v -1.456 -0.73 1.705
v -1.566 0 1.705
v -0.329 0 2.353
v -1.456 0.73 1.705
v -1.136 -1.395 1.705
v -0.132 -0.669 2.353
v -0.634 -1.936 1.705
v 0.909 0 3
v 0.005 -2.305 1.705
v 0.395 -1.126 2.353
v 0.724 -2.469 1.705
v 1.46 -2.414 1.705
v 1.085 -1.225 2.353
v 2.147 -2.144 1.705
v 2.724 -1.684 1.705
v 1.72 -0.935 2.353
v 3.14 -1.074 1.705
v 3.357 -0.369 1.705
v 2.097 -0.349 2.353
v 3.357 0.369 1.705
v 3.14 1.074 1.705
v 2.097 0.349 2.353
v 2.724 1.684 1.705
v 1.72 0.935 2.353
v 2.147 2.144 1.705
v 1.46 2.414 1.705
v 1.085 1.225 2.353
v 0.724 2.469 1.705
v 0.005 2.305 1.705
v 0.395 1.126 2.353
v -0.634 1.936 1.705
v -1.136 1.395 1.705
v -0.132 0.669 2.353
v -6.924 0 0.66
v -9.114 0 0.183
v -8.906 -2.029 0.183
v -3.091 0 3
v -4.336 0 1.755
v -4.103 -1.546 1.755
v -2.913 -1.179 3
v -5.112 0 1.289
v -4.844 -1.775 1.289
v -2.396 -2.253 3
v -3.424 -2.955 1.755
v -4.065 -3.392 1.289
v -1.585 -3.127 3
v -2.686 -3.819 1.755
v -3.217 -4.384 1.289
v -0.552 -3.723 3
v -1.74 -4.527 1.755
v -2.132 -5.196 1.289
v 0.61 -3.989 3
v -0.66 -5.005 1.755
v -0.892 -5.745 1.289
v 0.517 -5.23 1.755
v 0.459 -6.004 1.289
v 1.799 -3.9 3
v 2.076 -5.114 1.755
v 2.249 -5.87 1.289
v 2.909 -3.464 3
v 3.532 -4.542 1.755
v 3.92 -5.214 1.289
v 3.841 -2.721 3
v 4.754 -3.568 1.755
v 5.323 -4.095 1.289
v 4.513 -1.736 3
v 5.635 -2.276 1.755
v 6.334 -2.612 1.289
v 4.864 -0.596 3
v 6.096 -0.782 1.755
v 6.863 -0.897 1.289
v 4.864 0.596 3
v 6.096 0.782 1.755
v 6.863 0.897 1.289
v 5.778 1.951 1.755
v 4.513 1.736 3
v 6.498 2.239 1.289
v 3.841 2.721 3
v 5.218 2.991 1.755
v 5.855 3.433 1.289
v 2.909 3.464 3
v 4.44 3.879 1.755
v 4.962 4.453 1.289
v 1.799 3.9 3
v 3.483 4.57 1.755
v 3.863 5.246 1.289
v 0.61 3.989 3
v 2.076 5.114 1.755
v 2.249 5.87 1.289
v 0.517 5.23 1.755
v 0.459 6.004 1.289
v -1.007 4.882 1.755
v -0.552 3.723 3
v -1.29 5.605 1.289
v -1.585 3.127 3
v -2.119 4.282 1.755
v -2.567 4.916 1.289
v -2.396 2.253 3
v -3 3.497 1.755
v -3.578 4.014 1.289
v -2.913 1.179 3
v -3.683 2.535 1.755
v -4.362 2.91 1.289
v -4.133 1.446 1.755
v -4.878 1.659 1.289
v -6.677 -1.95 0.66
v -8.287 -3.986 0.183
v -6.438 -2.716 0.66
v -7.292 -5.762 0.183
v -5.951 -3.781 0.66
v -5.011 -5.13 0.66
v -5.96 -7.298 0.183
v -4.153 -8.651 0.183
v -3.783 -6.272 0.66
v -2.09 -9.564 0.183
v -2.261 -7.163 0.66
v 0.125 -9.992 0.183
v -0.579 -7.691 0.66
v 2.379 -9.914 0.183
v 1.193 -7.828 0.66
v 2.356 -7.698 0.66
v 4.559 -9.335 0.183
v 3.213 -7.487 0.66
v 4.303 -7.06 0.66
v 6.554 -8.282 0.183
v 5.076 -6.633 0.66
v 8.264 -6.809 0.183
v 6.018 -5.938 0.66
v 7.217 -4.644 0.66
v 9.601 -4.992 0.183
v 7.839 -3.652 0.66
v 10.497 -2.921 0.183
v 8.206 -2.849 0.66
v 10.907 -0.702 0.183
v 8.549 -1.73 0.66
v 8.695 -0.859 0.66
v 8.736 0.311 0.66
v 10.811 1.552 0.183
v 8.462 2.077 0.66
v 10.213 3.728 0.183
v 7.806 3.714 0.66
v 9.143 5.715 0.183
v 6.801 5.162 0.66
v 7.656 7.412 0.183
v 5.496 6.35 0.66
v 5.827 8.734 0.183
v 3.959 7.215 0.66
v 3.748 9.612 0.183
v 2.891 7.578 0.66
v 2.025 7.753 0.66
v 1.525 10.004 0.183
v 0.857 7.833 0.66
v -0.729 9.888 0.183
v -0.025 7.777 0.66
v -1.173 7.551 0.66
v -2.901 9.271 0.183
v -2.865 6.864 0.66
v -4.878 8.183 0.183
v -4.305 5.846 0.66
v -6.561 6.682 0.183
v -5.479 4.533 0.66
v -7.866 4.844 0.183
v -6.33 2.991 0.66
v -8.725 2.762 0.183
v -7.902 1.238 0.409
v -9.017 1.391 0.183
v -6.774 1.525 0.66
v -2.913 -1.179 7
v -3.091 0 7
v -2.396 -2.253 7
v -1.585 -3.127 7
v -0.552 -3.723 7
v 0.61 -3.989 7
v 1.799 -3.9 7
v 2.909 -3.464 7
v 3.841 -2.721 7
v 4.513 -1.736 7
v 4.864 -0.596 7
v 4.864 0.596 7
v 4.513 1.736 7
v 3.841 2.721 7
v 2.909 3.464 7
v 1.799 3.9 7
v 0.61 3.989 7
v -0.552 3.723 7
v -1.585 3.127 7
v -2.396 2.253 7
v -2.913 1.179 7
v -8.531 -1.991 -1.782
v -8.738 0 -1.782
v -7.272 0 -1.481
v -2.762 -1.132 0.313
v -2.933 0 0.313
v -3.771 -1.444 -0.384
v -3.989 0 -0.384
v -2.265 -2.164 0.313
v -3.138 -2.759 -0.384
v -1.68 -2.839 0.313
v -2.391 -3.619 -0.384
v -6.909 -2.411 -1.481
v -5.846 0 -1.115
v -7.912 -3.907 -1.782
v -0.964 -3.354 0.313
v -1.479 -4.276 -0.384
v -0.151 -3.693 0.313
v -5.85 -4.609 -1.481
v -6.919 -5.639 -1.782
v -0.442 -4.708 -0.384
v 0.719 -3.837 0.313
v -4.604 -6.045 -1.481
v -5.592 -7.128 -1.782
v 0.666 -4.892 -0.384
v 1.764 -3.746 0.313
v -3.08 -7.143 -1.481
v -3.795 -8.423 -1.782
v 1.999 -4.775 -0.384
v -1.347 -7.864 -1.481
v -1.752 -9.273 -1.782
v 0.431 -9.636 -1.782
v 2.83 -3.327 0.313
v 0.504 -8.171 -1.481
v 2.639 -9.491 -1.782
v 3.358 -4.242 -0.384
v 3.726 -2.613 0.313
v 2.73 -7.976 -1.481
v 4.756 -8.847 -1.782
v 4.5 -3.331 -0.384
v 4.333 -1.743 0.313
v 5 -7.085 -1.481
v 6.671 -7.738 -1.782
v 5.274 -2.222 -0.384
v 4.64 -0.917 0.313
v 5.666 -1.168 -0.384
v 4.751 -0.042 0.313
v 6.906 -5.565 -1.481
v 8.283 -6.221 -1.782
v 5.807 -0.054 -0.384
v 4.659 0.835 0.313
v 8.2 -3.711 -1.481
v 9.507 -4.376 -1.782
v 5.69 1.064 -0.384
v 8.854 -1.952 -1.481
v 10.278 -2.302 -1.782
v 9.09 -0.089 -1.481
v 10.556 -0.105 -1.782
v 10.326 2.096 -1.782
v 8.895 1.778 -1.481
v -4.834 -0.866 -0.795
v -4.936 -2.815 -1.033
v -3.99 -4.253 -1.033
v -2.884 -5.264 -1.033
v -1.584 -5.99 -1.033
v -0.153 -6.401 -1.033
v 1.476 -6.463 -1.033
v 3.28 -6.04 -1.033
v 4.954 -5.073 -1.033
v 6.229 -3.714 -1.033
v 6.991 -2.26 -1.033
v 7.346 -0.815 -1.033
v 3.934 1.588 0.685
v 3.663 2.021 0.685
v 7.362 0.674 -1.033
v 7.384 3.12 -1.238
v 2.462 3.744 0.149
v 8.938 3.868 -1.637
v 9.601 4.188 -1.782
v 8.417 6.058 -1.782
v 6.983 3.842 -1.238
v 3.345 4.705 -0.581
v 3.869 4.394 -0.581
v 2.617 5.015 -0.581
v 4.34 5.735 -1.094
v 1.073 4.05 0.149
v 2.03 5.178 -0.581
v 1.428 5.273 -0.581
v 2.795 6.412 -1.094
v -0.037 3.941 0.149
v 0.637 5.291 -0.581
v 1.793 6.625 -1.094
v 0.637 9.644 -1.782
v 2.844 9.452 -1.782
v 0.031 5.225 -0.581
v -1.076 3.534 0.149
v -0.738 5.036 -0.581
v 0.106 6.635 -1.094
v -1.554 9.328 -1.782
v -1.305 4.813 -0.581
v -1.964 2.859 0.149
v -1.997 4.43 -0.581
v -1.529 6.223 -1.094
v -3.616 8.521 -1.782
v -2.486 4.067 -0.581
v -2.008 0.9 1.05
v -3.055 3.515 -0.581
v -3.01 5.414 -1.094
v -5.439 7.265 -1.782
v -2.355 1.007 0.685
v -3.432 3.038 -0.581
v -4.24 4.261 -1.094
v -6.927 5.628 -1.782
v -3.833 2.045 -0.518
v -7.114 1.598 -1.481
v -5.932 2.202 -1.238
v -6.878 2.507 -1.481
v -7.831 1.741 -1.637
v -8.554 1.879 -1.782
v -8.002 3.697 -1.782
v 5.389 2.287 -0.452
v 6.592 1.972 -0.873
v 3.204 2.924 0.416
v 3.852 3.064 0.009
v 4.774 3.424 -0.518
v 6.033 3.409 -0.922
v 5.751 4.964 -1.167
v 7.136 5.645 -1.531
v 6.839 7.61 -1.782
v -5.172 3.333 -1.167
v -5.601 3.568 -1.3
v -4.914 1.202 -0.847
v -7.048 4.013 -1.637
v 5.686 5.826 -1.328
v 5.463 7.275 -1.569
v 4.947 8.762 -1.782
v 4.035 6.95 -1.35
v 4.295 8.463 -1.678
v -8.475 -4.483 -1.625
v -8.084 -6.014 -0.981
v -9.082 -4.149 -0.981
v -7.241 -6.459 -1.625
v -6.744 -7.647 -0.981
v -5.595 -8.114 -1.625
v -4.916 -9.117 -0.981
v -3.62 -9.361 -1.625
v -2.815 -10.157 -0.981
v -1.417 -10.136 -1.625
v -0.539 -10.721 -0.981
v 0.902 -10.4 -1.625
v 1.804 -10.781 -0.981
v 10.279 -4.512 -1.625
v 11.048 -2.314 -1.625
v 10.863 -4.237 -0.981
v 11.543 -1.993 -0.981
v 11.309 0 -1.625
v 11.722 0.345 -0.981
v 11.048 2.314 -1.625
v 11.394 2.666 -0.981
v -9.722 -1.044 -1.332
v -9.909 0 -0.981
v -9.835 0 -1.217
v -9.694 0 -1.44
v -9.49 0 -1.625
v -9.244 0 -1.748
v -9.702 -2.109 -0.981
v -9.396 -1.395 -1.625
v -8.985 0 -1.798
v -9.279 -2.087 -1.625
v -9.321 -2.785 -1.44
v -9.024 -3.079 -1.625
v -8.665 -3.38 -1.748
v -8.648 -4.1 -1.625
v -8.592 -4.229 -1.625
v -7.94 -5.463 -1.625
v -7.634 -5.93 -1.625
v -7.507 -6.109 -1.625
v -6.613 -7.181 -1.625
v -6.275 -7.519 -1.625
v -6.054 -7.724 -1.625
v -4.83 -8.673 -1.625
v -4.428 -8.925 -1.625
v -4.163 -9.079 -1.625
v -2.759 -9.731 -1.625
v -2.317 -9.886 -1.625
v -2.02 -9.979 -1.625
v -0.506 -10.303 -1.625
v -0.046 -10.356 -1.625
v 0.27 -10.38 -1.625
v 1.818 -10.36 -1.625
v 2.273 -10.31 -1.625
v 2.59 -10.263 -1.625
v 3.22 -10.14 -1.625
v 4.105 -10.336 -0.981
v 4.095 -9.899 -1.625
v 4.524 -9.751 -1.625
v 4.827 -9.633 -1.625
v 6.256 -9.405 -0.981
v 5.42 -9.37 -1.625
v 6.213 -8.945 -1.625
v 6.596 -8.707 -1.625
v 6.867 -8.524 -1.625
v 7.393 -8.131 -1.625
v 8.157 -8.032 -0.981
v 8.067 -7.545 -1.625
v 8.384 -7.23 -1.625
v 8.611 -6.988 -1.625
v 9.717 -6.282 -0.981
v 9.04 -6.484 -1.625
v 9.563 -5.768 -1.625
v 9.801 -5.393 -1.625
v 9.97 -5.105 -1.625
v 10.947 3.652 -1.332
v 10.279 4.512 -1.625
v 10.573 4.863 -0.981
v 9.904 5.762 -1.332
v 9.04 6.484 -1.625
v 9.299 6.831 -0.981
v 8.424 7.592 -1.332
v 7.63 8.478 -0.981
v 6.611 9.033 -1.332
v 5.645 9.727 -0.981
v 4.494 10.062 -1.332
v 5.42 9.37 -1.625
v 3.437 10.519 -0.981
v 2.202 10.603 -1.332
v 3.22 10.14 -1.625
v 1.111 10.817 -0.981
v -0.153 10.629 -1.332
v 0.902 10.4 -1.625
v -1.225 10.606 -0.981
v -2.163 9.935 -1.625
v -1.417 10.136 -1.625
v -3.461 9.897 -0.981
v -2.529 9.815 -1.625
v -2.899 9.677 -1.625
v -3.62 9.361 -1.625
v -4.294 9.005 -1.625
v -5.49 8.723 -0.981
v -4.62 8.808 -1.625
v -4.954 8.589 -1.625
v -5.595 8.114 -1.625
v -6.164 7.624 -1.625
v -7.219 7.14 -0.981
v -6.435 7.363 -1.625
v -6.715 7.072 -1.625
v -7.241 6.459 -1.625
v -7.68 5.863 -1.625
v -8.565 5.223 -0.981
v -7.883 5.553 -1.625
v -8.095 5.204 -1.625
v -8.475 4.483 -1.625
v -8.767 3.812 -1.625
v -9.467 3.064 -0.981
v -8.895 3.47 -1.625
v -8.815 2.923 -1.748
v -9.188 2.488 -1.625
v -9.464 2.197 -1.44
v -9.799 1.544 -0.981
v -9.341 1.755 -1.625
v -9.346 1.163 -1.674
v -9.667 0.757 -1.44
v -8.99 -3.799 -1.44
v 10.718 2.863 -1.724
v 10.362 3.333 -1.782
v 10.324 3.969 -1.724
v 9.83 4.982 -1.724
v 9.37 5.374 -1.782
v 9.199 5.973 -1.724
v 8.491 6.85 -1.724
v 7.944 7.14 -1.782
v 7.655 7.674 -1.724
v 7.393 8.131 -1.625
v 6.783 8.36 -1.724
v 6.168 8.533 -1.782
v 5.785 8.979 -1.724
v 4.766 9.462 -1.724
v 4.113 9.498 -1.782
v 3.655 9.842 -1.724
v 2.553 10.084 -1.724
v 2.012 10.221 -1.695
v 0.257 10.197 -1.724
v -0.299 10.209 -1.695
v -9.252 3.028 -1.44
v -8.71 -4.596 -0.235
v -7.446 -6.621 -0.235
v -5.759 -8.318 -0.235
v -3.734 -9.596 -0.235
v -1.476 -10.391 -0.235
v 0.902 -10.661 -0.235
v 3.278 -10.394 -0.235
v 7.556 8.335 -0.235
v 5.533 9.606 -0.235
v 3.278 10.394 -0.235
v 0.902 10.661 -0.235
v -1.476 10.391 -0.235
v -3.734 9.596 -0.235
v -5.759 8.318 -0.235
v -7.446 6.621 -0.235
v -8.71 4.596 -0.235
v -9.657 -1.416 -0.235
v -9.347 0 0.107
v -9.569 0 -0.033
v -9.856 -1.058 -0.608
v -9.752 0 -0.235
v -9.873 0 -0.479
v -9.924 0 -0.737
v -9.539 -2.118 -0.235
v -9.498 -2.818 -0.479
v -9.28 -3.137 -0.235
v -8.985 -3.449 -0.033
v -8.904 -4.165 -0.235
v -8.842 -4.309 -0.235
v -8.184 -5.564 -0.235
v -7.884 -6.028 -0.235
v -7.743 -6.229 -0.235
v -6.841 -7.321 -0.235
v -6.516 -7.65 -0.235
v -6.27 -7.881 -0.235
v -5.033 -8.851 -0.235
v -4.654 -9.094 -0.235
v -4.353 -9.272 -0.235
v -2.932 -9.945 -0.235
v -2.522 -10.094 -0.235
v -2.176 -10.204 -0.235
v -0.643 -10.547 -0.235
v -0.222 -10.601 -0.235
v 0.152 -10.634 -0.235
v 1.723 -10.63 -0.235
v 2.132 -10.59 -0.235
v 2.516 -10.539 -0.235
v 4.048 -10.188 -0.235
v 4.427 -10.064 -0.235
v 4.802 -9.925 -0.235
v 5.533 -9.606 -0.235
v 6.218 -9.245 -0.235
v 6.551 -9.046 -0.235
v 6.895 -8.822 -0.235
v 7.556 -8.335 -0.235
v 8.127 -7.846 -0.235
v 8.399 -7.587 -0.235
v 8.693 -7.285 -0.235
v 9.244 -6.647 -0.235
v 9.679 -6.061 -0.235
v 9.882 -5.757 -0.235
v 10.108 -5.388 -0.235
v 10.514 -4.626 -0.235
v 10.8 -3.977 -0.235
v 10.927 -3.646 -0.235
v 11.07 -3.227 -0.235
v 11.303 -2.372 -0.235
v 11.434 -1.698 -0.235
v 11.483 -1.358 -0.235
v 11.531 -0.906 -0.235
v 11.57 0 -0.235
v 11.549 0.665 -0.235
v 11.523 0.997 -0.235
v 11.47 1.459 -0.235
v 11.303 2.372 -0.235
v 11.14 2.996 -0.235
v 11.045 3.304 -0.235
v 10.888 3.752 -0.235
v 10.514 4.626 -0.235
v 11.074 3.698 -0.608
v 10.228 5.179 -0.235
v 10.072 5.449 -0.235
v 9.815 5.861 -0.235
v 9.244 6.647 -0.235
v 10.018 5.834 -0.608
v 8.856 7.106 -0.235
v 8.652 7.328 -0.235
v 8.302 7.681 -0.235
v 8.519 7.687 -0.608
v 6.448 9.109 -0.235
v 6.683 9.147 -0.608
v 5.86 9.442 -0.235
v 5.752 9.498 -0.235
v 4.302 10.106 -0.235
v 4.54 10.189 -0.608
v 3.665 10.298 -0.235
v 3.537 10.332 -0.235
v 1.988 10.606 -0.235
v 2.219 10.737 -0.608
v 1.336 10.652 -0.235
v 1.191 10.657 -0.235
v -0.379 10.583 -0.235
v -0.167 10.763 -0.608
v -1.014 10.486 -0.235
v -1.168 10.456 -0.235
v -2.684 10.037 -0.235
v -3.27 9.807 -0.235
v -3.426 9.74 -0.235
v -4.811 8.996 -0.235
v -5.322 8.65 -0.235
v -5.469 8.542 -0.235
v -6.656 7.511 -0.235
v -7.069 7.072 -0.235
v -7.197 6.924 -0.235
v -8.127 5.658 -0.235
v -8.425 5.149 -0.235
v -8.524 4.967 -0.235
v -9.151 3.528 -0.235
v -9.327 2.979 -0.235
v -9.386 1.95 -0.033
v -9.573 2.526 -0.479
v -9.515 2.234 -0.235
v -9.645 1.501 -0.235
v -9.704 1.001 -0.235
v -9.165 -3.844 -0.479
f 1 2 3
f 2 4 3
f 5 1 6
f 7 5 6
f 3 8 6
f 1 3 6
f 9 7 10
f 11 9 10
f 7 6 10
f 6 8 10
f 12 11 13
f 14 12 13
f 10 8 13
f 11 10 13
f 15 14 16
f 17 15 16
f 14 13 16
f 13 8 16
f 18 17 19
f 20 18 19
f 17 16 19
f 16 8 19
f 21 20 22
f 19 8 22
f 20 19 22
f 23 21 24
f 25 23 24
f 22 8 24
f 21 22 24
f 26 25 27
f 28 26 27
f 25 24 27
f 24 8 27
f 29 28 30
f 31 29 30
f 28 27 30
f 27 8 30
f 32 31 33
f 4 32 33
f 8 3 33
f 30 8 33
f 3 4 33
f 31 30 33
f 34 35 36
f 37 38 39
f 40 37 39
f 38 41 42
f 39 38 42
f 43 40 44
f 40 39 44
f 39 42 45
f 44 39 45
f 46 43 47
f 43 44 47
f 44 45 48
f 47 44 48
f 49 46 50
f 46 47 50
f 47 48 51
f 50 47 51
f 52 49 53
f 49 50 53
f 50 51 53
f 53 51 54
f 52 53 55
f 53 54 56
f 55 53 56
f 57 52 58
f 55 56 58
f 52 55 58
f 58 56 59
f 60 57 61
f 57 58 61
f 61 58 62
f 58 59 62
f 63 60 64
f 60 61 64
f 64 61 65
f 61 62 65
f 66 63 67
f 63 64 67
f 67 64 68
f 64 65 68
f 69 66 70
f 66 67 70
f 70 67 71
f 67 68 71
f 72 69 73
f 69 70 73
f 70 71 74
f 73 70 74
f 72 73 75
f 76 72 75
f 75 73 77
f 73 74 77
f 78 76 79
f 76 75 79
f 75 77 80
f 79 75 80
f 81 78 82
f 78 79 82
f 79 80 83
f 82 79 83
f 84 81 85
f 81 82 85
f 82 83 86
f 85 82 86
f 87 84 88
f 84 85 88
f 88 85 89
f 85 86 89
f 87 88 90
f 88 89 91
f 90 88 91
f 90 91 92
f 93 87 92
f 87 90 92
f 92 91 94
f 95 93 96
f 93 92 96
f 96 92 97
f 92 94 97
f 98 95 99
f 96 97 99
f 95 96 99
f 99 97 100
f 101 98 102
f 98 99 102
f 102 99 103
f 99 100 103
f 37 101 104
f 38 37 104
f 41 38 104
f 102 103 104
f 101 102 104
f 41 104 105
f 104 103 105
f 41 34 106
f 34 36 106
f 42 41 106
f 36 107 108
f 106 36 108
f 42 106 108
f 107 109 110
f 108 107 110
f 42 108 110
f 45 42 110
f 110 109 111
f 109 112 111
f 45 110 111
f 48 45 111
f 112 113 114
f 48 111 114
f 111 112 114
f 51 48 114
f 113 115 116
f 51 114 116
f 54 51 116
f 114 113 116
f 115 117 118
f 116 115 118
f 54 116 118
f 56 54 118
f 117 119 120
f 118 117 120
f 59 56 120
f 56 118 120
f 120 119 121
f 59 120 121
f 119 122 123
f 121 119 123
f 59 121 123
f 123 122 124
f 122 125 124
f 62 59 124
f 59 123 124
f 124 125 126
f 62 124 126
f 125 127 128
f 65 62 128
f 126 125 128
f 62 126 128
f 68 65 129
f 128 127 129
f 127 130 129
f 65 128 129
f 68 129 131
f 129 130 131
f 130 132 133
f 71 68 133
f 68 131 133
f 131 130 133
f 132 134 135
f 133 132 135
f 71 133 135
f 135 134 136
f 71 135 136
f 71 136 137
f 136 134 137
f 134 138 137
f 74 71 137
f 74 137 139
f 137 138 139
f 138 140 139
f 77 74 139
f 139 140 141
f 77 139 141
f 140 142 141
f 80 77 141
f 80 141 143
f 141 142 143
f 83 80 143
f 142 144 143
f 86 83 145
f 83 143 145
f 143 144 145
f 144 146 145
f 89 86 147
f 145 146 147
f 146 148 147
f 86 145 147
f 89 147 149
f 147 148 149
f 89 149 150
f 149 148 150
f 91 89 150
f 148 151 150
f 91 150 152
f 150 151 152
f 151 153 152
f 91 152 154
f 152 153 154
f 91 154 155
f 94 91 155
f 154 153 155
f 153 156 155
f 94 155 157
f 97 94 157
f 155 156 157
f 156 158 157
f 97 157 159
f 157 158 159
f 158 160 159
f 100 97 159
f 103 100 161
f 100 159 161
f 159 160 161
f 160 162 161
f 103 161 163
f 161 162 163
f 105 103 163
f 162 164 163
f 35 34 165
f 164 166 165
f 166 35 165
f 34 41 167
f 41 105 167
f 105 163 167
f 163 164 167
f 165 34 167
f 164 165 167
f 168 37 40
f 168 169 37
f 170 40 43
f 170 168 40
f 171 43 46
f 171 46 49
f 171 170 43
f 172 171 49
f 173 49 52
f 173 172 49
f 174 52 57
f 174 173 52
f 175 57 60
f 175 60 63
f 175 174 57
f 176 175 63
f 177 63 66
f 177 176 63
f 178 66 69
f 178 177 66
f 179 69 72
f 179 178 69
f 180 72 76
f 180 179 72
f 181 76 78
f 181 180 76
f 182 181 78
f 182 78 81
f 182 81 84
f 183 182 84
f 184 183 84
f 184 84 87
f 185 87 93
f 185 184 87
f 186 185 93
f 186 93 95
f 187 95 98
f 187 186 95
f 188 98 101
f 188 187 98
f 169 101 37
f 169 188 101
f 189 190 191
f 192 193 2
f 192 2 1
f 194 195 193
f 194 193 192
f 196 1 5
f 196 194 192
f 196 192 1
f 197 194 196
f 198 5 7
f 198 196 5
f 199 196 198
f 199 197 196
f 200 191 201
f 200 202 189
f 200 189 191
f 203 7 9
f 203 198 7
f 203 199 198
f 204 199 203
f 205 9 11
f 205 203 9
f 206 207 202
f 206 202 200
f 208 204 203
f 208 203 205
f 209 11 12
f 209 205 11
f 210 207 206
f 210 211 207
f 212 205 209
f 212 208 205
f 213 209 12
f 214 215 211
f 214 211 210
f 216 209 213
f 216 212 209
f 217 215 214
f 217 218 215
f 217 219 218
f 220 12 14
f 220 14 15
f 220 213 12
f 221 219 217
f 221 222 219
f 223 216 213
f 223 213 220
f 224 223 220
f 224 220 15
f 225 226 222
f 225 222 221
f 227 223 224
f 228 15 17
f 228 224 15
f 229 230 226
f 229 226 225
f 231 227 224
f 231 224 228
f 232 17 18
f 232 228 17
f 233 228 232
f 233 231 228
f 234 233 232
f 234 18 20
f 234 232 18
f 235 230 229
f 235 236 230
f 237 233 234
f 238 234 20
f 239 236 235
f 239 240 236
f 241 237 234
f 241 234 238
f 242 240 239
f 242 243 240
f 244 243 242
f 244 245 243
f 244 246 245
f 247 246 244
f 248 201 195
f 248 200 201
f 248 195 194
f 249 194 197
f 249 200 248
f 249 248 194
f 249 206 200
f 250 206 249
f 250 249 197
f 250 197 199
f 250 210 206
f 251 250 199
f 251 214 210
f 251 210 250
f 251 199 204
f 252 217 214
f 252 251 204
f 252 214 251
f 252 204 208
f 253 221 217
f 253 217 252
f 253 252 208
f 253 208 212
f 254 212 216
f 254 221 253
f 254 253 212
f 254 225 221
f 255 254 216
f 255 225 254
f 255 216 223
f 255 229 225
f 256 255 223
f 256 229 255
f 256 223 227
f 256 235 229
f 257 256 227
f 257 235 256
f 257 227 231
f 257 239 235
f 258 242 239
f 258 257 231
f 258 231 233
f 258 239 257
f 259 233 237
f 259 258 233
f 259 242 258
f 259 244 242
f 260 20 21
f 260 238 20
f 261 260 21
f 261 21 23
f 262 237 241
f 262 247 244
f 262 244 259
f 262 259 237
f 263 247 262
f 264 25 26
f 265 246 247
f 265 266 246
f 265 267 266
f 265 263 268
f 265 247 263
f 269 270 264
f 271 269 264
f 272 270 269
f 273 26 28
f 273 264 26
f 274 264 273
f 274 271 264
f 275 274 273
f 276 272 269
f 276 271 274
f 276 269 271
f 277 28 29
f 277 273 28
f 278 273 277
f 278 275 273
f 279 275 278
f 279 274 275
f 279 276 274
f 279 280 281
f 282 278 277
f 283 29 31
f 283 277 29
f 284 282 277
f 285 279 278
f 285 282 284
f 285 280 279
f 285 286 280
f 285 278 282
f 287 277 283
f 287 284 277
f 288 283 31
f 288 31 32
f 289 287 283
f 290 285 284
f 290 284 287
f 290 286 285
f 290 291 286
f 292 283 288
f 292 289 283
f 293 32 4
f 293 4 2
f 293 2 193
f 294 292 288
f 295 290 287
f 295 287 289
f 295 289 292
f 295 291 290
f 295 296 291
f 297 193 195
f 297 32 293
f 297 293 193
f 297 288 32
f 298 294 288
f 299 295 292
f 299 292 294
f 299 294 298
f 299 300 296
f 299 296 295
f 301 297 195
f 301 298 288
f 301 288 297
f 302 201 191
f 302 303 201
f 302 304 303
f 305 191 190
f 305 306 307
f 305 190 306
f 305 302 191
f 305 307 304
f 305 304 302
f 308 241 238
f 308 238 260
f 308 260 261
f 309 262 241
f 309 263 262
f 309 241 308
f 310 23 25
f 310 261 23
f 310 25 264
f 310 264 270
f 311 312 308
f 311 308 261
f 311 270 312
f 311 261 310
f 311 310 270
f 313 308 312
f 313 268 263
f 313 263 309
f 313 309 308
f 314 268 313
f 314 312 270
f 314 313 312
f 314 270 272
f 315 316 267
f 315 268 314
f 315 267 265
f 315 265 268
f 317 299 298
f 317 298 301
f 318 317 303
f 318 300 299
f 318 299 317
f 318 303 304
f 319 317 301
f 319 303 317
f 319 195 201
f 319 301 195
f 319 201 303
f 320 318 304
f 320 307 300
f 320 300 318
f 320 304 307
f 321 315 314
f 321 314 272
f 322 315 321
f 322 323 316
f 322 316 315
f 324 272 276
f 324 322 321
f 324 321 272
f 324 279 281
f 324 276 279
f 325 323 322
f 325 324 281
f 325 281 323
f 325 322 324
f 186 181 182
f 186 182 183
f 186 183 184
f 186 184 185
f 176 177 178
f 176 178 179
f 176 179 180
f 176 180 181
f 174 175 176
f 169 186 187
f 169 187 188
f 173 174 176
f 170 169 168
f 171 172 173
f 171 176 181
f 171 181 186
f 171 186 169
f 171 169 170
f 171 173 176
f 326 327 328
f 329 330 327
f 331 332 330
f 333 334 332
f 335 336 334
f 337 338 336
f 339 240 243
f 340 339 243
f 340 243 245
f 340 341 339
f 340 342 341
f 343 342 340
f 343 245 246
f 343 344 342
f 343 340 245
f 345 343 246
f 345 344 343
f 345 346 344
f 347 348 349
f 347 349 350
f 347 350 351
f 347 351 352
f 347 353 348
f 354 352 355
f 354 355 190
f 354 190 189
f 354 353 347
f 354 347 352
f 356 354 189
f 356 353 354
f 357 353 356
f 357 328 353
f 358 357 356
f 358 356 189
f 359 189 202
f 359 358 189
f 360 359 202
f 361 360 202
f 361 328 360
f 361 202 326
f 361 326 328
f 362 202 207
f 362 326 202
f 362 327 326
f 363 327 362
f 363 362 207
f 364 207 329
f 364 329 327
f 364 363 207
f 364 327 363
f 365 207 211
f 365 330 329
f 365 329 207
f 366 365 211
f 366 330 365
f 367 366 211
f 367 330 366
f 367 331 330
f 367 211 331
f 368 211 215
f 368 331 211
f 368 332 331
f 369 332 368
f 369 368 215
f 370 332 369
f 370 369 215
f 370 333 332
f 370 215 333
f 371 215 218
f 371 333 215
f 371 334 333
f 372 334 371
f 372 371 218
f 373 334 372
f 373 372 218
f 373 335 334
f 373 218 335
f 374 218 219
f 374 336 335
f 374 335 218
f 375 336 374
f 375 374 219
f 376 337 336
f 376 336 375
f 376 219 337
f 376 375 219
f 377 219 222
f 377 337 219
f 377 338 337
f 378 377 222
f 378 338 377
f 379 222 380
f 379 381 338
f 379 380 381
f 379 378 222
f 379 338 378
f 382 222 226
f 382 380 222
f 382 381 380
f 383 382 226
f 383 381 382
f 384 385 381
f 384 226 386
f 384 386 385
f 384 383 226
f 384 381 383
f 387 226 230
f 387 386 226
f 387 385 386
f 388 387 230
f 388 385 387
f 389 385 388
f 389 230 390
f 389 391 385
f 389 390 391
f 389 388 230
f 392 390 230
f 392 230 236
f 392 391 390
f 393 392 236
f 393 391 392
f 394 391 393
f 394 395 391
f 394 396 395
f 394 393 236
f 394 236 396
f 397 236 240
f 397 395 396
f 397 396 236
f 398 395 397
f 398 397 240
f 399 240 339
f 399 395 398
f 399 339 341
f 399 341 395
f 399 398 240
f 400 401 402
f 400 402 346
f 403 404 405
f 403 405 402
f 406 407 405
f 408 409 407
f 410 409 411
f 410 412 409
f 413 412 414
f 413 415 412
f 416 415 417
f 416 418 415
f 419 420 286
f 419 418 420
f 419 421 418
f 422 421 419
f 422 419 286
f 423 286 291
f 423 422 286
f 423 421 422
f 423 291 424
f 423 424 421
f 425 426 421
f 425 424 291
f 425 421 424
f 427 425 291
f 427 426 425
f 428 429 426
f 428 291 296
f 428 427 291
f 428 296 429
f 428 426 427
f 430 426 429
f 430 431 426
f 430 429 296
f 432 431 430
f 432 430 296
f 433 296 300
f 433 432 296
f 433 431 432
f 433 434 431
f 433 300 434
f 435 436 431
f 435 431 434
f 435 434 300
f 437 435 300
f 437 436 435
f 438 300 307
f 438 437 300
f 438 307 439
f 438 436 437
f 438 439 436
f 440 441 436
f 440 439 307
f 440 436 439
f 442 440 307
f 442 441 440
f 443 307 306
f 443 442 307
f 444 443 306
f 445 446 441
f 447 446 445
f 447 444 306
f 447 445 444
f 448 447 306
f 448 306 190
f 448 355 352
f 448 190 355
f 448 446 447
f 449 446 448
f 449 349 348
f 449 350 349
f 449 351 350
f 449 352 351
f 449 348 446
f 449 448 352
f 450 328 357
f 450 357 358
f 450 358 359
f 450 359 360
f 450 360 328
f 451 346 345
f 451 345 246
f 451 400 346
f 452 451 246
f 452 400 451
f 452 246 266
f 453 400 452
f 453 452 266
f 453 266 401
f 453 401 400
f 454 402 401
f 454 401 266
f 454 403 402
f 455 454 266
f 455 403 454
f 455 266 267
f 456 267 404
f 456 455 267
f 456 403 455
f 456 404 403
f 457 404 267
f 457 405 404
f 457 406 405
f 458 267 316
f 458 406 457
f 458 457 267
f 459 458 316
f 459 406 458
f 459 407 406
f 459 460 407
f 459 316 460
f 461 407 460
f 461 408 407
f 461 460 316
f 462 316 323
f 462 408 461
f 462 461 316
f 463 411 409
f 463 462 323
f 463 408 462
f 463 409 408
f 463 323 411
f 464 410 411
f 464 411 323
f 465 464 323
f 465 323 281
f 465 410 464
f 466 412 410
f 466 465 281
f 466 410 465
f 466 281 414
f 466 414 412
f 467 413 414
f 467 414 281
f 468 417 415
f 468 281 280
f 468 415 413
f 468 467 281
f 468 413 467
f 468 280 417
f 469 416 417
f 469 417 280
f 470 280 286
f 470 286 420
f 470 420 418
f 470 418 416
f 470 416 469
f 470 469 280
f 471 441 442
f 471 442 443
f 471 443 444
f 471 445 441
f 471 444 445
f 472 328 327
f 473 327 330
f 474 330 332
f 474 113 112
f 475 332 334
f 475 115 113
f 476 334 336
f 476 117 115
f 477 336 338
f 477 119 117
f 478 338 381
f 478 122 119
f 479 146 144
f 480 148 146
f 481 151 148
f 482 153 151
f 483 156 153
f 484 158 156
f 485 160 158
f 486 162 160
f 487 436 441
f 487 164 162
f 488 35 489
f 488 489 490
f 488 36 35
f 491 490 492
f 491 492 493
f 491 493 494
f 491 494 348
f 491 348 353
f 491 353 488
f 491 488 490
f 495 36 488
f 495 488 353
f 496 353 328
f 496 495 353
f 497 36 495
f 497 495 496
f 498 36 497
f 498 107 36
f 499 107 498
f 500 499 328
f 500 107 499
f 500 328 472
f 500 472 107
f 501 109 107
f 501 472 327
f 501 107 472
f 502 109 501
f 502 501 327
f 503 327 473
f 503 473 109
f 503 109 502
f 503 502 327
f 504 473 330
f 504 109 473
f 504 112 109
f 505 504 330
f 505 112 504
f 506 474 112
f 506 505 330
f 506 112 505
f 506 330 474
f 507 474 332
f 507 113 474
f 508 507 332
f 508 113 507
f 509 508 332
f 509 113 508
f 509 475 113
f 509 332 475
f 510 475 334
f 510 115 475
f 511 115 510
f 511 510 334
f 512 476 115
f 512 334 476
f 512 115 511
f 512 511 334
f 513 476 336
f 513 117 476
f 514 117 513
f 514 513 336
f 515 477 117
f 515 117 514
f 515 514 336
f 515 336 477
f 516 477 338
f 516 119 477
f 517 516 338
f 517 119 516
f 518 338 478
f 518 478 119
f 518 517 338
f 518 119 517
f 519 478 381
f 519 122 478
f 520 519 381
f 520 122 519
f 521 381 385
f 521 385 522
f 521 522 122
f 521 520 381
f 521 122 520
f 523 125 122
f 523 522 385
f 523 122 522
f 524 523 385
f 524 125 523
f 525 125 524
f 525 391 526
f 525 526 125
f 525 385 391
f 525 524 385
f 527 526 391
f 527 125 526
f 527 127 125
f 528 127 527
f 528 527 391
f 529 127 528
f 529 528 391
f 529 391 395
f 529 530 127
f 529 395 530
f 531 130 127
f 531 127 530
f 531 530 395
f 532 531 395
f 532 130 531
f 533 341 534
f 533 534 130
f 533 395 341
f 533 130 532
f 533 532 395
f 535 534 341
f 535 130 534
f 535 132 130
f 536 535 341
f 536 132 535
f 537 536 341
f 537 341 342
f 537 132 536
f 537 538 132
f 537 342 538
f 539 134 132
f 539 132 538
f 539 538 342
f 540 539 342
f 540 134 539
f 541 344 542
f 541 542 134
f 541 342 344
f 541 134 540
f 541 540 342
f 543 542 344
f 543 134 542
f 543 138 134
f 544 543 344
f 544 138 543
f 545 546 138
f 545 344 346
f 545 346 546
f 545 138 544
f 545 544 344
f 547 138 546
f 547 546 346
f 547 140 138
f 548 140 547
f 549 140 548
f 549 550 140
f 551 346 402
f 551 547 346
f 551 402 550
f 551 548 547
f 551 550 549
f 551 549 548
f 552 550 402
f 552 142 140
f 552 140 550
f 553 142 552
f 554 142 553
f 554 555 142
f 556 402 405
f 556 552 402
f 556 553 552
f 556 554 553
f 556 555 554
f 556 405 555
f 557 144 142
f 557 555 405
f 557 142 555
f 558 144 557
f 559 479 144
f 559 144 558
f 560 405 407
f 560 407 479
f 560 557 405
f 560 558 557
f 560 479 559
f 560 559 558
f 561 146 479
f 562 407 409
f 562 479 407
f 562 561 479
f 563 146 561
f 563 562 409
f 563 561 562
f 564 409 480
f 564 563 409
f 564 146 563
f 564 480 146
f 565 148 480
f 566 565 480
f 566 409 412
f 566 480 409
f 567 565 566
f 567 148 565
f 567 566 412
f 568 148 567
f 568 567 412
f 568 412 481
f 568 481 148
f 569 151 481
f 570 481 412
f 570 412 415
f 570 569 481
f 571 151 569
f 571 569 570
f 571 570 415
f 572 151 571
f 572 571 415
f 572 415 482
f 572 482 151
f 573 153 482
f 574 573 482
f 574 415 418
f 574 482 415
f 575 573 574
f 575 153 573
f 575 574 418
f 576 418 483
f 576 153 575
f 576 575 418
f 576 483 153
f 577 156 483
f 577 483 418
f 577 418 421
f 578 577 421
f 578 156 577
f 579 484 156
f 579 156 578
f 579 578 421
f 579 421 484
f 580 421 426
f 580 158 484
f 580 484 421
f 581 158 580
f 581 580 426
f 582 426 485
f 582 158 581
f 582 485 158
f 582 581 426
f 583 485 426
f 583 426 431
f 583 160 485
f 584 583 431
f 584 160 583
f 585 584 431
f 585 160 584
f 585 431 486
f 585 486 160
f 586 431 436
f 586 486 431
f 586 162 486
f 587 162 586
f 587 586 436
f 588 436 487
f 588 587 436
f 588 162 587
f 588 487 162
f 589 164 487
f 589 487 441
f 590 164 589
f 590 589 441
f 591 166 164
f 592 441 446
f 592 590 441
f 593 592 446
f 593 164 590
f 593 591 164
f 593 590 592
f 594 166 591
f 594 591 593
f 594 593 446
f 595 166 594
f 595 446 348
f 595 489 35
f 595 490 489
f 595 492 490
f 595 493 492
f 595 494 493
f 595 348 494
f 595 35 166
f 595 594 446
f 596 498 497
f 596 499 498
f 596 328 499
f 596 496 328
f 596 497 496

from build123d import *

# Parameters (mm, degrees)
F0_W = 4
F0_H = 4
F2_R = 0.99999


# Not quite as in the source:
# - a fillet or chamfer is up to 0.001 mm smaller than in the source, because OpenCascade refuses the exact size
# - the dataset's text gives a spline's control points without its knots; the knots are read off the source's solid


with BuildPart() as f1:
    # F0 (on Front) → F1 (revolve)
    with BuildSketch(Plane.XZ):
        with BuildLine():
            Line((0.9091711268, 3), (-3.0908288732, 3))
            add(Edge.make_bspline(
                [(-3.0908288732, 3), (-3.5834098611, 2.4200538723), (-4.8095609066, 0.976430248), (-8.1139250982, 0.3655009849), (-10.0908288732, 0)],
                knots=[0, 0, 0, 0, 0.4017294522, 1, 1, 1, 1], degree=3))
            Line((-10.0908288732, 0), (-9.7272200714, -1.9666694281))
            add(Edge.make_bspline(
                [(-1.5664662541, 1.7052727679), (-1.7197351348, 1.5248198149), (-2.063357916, 1.1180932901), (-2.6429158857, 0.5377987308), (-3.2231154482, 0.0813793664), (-3.7171330132, -0.2427740222), (-4.2708452388, -0.5352938299), (-4.8332722817, -0.7761481117), (-5.411616192, -0.9839057168), (-6.200976021, -1.2257159643), (-7.2204637167, -1.4786072566), (-8.4760577728, -1.735410051), (-9.3141745474, -1.8903032702), (-9.7272200714, -1.9666694281)],
                knots=[0, 0, 0, 0, 0.125, 0.25, 0.3125, 0.375, 0.4375, 0.5, 0.5625, 0.625, 0.75, 0.875, 1, 1, 1, 1], degree=3))
            Line((-1.5664662541, 1.7052727679), (0.9091711268, 3))
        make_face()
        with Locations((-1.0908288732, 5)):
            Rectangle(F0_W, F0_H)
    revolve(axis=Axis((0.9091711268, 0, 5), (0, 0, 1)))

    # F2 (radius 1 in the source; OpenCascade refuses exactly that, so slightly less here)
    f2_edges = [f1.edges().sort_by_distance(p)[0] for p in [
        (11.545562, 0, -1.966669),
        (11.909171, 0, 0),
    ]]
    fillet(f2_edges, radius=F2_R)


solid = f1.part
